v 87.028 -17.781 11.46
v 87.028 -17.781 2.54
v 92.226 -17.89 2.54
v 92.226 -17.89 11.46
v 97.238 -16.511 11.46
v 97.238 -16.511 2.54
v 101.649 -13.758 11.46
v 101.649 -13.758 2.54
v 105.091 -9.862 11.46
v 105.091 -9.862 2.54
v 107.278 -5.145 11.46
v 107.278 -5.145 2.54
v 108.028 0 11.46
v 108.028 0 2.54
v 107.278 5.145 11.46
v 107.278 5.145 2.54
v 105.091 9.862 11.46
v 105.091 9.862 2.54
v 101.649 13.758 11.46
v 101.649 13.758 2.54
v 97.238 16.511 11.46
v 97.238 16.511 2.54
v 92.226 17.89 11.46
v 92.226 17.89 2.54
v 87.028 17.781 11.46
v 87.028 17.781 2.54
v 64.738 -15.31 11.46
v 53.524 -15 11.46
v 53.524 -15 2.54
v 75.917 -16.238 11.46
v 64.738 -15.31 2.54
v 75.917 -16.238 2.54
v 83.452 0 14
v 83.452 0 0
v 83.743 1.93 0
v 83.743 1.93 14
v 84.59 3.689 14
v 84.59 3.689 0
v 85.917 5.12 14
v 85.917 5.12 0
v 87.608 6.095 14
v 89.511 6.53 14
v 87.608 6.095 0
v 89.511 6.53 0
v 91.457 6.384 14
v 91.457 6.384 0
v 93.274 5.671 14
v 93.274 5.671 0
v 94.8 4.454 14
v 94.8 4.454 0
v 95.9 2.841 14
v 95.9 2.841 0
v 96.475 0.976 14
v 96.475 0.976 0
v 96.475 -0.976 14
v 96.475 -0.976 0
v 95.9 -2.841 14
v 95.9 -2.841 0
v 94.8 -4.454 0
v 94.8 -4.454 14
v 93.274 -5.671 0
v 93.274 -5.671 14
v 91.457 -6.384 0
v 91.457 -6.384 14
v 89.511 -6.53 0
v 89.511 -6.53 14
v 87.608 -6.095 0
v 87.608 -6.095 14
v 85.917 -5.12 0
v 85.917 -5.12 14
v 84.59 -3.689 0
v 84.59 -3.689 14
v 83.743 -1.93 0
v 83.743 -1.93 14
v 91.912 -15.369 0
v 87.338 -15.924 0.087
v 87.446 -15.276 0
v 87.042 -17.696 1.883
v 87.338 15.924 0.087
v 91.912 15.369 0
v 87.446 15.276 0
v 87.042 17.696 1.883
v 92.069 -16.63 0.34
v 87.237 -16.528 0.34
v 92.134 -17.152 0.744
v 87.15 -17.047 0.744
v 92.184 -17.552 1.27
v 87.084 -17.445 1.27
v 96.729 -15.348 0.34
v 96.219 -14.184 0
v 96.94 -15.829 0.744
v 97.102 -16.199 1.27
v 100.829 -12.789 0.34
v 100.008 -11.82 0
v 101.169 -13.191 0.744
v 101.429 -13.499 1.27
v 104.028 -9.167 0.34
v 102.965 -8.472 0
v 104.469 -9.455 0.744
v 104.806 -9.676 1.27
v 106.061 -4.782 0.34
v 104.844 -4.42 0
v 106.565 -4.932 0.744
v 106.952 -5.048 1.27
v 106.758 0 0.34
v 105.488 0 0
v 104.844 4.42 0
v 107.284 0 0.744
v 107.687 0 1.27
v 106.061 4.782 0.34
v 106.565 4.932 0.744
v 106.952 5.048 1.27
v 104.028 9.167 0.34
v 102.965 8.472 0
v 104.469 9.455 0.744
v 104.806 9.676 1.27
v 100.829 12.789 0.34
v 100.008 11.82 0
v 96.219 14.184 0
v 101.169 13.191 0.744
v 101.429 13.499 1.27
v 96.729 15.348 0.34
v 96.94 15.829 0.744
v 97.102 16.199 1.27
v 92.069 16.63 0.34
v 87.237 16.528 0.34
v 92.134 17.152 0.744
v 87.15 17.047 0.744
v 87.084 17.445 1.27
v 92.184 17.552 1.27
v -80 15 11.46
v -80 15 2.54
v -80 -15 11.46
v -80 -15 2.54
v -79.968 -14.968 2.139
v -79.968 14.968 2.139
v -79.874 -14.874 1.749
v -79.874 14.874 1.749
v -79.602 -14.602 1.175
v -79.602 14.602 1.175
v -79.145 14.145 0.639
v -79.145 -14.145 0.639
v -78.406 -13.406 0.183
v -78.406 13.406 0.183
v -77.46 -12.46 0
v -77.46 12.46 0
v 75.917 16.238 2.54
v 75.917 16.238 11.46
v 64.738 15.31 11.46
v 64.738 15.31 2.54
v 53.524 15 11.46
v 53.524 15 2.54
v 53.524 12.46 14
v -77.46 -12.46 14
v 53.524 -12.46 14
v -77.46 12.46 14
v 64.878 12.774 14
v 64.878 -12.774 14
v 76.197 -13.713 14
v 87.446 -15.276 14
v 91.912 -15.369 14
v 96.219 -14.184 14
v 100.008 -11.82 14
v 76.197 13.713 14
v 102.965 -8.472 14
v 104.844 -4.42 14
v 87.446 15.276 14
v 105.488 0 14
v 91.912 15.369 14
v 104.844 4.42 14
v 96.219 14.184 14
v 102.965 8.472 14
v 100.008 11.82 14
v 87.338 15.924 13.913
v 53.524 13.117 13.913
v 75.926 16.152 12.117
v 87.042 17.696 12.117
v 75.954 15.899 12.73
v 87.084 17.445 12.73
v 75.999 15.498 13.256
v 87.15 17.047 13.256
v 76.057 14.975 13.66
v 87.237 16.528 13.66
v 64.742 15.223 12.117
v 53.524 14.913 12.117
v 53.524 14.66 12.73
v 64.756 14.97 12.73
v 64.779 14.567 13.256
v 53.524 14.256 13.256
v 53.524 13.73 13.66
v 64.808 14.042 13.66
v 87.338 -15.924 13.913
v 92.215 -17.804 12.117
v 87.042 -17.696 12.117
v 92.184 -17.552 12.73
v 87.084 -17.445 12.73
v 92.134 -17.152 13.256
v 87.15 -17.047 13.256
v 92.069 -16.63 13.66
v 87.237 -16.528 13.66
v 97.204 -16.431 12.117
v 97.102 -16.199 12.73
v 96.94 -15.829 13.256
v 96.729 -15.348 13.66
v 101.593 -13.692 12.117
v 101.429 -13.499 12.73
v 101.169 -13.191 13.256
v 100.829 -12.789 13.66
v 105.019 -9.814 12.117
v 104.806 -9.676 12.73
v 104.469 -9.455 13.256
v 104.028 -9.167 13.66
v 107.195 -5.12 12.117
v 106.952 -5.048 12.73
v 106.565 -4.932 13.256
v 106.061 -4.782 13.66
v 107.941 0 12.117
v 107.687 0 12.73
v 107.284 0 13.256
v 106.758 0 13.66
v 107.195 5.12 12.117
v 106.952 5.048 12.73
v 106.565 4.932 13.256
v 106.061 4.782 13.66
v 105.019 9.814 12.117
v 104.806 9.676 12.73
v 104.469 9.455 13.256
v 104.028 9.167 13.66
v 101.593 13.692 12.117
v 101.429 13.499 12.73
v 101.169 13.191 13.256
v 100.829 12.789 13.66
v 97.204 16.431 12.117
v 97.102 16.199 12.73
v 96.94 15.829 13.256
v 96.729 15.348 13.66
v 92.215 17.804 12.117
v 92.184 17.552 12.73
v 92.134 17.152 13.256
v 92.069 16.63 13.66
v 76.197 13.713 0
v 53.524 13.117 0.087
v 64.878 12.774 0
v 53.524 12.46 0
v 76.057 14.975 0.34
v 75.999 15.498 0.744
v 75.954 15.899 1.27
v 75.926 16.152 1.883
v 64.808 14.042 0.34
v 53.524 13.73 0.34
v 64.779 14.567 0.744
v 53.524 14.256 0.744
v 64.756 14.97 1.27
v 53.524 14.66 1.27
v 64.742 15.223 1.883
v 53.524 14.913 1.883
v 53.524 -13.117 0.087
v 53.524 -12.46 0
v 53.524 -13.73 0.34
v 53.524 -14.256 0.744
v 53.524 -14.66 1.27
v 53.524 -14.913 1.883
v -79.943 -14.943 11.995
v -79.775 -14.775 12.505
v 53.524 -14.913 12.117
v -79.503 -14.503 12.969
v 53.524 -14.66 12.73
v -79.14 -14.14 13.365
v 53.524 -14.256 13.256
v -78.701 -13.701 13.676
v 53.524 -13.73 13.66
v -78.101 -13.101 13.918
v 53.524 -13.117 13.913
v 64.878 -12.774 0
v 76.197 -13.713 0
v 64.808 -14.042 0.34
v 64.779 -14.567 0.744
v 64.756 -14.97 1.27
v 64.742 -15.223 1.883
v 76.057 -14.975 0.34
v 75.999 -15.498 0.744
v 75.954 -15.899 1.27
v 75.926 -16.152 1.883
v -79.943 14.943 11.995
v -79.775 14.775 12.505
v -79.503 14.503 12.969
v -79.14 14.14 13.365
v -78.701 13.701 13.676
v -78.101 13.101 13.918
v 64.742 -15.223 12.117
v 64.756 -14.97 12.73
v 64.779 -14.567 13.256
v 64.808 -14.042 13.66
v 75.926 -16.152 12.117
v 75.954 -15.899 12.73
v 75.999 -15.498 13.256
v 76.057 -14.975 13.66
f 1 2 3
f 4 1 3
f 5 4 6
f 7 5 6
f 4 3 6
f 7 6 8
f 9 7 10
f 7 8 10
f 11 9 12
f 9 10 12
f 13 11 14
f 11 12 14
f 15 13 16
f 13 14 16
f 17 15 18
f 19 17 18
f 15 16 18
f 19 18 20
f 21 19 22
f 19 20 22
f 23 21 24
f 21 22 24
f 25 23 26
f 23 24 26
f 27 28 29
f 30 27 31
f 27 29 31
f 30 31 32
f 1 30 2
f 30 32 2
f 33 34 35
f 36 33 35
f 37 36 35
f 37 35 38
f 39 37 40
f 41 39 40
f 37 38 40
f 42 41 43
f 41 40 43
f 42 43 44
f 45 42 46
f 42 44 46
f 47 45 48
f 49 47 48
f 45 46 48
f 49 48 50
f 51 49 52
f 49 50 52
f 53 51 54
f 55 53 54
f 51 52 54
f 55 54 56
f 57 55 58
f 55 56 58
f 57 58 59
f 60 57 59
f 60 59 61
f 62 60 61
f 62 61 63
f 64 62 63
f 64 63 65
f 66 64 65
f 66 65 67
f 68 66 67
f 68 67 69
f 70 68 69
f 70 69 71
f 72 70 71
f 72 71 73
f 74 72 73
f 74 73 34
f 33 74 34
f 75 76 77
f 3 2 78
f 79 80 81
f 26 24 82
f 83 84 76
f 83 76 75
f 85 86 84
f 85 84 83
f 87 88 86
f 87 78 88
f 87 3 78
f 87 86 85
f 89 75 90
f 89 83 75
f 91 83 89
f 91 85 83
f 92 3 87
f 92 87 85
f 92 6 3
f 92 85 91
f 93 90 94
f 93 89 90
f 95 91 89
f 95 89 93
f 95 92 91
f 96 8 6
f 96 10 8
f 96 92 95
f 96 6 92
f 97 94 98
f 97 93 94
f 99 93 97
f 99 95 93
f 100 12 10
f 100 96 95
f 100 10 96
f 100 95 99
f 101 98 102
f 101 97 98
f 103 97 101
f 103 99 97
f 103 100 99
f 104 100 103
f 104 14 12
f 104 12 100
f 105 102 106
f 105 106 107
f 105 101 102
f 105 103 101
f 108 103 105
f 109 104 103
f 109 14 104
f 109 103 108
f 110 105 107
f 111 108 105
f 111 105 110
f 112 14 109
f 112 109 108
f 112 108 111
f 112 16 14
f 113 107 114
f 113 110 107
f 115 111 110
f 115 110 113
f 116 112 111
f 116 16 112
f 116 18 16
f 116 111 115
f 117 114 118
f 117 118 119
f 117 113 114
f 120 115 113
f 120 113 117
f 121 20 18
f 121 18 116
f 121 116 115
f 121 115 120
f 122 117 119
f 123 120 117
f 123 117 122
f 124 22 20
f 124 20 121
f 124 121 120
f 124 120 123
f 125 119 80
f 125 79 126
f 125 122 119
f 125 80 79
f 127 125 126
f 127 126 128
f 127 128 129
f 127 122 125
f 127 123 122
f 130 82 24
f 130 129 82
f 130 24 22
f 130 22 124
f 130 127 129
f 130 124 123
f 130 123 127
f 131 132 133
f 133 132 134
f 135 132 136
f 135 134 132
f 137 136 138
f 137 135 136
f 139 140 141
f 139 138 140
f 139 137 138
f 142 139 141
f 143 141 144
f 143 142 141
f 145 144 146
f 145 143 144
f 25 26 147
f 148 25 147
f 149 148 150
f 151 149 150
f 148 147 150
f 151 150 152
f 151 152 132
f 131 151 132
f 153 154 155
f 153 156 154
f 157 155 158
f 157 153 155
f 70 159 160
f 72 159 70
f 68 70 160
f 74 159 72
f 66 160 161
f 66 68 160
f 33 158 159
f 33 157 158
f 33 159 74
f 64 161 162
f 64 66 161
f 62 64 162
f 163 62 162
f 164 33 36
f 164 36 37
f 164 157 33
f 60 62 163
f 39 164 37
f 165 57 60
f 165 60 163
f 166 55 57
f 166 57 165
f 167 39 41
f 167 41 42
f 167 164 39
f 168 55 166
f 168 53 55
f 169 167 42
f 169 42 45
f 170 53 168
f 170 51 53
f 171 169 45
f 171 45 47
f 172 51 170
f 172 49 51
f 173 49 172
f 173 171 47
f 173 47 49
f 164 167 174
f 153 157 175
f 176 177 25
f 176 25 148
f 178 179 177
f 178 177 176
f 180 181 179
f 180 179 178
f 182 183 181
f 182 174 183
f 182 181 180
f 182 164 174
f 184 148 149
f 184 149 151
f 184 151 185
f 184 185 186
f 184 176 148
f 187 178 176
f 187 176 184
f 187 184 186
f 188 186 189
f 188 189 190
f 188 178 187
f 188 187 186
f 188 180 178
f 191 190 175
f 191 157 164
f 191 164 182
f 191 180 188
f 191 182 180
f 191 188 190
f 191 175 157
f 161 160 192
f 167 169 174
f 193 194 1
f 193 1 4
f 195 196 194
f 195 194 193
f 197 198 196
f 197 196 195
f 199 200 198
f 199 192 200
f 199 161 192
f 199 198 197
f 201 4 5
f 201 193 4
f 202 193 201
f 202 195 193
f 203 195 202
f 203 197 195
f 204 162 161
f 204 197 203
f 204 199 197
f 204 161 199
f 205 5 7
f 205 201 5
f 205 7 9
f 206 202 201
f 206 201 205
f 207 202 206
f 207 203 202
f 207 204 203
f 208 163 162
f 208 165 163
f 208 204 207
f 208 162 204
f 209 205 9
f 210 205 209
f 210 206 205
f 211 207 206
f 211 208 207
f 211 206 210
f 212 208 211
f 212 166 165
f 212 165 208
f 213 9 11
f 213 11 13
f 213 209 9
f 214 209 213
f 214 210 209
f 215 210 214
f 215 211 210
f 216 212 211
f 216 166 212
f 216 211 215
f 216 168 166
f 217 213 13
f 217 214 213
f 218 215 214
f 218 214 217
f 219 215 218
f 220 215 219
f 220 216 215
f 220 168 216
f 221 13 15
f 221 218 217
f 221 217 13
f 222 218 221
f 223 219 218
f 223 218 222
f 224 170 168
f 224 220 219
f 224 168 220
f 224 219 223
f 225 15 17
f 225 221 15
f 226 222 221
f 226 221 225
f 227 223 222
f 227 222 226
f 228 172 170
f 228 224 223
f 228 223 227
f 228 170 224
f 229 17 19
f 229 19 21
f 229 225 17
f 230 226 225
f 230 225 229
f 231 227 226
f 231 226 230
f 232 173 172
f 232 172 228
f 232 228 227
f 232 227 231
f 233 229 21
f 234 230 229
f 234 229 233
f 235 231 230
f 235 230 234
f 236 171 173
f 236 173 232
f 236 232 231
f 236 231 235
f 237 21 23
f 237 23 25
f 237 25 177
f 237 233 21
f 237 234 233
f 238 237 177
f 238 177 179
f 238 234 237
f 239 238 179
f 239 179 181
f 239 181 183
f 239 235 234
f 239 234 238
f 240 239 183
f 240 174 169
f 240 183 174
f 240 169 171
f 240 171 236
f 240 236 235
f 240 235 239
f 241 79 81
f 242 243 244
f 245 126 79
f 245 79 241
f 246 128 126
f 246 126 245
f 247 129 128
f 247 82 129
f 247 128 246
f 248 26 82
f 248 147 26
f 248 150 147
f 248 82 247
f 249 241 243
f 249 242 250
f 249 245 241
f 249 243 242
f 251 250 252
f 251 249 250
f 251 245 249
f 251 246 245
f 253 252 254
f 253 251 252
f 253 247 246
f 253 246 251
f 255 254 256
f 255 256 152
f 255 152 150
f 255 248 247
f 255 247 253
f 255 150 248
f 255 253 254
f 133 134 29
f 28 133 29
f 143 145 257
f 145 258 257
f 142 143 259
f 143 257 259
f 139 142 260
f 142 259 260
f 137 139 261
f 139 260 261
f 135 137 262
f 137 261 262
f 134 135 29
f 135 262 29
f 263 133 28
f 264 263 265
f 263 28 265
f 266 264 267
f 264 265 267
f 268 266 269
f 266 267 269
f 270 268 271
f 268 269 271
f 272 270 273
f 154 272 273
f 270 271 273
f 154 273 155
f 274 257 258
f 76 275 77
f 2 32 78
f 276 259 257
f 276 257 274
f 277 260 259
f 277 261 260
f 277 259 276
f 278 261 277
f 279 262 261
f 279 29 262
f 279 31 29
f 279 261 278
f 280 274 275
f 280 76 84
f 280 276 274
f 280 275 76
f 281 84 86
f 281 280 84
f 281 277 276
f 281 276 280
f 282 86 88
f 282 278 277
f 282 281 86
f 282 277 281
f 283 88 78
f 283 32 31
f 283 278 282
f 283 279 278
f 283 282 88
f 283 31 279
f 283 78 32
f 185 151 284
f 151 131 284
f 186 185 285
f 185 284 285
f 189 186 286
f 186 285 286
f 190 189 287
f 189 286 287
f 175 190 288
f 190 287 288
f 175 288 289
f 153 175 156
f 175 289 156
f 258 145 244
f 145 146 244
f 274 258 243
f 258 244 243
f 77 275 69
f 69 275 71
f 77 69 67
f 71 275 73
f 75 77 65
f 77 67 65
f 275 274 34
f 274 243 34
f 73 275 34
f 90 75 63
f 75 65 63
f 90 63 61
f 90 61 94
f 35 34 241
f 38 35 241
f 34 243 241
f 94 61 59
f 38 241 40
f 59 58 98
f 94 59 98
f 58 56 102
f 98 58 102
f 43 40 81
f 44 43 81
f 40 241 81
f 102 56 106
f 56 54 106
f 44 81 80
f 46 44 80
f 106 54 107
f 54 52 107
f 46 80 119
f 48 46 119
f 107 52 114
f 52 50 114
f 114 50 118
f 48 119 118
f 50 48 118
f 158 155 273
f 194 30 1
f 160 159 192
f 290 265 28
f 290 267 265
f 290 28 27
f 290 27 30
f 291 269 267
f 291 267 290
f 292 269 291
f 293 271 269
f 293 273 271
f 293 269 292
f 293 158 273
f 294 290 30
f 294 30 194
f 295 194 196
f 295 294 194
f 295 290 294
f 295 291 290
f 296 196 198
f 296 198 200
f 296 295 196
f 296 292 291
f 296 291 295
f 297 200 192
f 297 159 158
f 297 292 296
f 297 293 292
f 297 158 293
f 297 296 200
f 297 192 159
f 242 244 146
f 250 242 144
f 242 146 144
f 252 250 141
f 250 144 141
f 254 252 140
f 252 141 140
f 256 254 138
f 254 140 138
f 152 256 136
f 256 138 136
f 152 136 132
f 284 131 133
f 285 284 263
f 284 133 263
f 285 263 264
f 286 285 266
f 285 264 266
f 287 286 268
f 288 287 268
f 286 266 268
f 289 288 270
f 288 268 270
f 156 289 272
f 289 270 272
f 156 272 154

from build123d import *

# Parameters (mm, degrees)
BOSS_EXTRUDE1_DEPTH      = 14
FILLET1_R                = 2.54
FILLET2_R                = 2.54
F_9_16_18_TAPPED_HOLE1_D = 13.09624


with BuildPart() as part:
    # Sketch1 → Boss-Extrude1 (new body)
    with BuildSketch(Plane.XY):
        with BuildLine():
            Line((-80, -15), (53.524252006, -15))
            ThreePointArc((53.524252006, -15), (70.333541706, -15.696449958), (87.02760671, -17.78102579))
            ThreePointArc((87.02760671, -17.78102579), (108.027756377, 0), (87.02760671, 17.78102579))
            ThreePointArc((87.02760671, 17.78102579), (70.333541706, 15.696449958), (53.524252006, 15))
            Line((53.524252006, 15), (-80, 15))
            Line((-80, 15), (-80, -15))
        make_face()
    extrude(amount=BOSS_EXTRUDE1_DEPTH)

    # Fillet1
    fillet1_edges = [part.edges().sort_by_distance(p)[0] for p in [
        (70.333541706, -15.696449958, 14),
        (108.027756377, 0, 14),
        (70.333541706, 15.696449958, 14),
        (-13.237873997, 15, 14),
        (-80, 0, 14),
        (-13.237873997, -15, 14),
    ]]
    fillet(fillet1_edges, radius=FILLET1_R)

    # Fillet2
    fillet2_edges = [part.edges().sort_by_distance(p)[0] for p in [
        (-13.237873997, 15, 0),
        (70.333541706, 15.696449958, 0),
        (108.027756377, 0, 0),
        (70.333541706, -15.696449958, 0),
        (-13.237873997, -15, 0),
        (-80, 0, 0),
    ]]
    fillet(fillet2_edges, radius=FILLET2_R)

    # 9/16-18 Tapped Hole1 (through all)
    with Locations(Plane.XY.offset(14)):
        with Locations((90, 0)):
            Hole(F_9_16_18_TAPPED_HOLE1_D / 2)


solid = part.part
